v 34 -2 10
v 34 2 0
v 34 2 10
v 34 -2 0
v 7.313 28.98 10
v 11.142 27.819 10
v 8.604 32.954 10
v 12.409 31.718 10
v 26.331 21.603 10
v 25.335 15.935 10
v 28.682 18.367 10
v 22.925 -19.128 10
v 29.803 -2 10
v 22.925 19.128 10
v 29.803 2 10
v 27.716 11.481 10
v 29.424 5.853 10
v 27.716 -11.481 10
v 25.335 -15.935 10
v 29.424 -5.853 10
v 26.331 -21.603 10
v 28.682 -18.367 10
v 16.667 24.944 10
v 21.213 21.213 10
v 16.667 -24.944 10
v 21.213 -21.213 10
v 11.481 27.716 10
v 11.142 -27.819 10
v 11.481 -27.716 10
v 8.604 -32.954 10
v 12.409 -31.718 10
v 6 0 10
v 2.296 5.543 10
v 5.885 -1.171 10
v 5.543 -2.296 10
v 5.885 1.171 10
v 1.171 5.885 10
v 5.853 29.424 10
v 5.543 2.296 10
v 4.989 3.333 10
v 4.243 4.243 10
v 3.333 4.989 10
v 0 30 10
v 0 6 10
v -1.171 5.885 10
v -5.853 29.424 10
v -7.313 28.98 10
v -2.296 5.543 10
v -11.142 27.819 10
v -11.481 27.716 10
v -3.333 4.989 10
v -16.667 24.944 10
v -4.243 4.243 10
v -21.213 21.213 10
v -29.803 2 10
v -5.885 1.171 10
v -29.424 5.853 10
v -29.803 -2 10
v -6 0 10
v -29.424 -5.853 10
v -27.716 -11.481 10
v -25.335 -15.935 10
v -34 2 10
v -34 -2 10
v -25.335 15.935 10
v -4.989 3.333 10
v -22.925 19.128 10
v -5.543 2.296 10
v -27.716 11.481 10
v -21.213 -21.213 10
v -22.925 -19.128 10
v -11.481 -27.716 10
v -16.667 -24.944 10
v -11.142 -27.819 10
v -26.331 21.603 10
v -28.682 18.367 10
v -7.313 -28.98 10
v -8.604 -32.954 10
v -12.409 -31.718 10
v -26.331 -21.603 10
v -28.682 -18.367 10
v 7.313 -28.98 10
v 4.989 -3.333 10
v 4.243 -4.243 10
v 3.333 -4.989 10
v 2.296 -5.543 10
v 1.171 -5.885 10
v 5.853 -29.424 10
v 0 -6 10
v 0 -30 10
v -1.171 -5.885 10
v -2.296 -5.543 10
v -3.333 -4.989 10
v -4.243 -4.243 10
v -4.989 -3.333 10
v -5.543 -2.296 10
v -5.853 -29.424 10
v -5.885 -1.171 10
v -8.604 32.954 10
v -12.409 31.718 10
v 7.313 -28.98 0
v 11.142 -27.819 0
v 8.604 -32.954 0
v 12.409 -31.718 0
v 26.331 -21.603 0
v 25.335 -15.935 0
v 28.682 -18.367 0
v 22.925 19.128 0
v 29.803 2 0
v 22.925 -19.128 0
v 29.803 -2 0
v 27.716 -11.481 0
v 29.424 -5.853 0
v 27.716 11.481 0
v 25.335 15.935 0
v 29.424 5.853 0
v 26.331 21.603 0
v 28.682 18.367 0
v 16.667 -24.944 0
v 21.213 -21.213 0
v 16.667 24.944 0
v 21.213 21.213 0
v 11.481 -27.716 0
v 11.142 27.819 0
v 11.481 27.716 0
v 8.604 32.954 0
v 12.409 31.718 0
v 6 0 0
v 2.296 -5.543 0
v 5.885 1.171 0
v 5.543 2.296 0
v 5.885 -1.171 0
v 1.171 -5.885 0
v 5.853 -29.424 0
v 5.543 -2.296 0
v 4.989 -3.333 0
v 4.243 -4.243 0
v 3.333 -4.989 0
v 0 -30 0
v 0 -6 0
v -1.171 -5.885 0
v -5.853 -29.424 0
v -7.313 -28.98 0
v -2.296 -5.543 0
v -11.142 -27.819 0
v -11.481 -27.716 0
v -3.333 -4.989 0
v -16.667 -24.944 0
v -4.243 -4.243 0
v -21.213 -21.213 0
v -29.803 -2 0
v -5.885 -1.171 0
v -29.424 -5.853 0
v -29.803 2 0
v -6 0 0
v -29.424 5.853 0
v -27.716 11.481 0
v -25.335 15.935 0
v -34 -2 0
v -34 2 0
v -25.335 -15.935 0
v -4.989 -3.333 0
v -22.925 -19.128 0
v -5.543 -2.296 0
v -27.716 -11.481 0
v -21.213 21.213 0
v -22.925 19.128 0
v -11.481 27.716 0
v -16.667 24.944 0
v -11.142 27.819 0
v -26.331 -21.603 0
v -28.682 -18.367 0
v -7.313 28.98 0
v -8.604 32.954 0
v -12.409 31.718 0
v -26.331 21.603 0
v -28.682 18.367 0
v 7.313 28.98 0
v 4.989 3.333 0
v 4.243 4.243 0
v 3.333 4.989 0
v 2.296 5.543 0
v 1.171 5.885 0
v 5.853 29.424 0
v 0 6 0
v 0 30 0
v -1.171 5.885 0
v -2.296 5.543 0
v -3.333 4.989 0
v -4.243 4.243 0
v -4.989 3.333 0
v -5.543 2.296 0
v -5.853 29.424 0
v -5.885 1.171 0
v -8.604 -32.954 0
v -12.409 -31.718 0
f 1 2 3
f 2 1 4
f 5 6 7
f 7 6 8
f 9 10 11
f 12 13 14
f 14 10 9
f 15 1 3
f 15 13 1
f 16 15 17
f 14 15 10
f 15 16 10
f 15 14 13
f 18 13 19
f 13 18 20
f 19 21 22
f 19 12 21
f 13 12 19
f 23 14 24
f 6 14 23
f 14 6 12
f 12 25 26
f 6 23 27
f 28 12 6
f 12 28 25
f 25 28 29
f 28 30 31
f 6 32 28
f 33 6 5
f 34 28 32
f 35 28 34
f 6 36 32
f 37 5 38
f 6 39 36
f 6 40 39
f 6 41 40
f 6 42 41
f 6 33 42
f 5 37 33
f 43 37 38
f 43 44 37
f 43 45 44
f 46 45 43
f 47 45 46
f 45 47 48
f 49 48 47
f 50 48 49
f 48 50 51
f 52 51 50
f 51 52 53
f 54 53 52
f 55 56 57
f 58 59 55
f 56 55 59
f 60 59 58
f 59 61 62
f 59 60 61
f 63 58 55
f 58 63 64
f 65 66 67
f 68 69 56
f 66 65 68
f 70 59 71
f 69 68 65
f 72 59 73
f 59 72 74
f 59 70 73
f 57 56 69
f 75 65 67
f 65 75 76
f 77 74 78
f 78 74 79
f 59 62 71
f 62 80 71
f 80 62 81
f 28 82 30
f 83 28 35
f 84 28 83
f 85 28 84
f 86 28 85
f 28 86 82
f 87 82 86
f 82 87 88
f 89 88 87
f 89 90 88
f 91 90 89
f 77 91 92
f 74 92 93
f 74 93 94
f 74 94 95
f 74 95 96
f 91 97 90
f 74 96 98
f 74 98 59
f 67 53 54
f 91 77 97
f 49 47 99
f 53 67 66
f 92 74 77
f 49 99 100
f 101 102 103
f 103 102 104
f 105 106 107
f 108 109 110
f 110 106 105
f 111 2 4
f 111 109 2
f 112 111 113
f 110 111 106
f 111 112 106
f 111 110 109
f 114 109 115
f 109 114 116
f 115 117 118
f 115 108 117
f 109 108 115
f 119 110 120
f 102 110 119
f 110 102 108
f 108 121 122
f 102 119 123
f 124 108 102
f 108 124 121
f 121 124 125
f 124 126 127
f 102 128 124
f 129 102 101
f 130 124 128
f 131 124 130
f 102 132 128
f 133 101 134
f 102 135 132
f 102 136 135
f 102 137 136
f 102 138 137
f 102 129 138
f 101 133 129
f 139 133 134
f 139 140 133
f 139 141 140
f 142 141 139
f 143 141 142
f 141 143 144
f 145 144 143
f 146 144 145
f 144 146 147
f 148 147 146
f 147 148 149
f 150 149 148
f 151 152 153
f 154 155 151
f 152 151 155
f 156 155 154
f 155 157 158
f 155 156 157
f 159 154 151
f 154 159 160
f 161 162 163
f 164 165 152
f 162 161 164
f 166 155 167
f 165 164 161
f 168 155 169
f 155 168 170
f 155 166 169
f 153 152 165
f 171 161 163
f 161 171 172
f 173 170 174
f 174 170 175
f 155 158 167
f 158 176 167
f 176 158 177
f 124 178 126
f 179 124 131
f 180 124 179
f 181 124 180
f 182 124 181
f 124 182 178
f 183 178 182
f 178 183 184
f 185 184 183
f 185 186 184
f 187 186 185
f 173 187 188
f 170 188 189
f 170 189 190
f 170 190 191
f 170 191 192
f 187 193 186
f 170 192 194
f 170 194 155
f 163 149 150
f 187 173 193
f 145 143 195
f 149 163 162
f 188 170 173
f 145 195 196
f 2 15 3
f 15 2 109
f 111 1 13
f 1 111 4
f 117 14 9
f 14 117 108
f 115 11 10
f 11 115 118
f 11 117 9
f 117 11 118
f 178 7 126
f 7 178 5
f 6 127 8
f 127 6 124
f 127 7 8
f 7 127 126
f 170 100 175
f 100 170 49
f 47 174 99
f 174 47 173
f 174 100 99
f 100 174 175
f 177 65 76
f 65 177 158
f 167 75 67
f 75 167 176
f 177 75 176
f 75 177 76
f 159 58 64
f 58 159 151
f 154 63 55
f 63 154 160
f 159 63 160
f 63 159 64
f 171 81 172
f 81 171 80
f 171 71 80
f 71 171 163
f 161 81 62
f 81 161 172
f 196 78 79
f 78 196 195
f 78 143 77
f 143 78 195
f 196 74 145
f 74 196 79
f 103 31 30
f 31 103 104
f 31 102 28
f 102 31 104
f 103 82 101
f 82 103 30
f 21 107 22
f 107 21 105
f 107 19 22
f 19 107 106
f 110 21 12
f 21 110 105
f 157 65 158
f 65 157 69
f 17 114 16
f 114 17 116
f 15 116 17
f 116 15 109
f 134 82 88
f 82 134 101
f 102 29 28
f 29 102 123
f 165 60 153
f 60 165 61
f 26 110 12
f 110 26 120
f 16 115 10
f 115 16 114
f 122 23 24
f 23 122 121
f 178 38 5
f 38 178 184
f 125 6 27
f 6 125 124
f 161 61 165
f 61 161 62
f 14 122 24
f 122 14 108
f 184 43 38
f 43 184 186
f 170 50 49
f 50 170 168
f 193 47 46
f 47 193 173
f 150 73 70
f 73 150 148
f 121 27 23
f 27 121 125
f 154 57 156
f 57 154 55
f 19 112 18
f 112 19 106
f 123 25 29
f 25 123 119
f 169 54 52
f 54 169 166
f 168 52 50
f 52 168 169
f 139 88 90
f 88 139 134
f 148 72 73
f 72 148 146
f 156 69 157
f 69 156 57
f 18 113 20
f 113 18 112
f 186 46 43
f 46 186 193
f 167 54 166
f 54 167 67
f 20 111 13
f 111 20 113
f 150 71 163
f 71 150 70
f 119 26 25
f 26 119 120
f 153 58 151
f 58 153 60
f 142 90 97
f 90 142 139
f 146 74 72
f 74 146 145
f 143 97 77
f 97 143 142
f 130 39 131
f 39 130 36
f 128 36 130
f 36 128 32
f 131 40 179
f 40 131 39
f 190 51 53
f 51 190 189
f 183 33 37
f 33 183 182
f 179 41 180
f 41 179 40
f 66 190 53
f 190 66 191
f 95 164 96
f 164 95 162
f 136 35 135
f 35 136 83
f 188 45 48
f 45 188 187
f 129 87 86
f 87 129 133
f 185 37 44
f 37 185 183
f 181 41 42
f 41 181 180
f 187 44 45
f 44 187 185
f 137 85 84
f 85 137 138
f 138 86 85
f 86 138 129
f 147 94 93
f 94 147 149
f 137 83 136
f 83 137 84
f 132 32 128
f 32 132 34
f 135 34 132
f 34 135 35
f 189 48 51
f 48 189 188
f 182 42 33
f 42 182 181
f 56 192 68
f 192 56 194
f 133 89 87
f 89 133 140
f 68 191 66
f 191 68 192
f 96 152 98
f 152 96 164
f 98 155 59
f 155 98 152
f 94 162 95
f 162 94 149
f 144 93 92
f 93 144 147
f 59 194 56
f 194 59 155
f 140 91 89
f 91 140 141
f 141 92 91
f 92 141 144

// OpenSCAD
$fn = 32;

// ----------------------------------------------------------------------
// Spur blank: bored gear blank
// ----------------------------------------------------------------------

// --- parameters (mm) ---
disc_r = 30;              // blank root radius
disc_t = 10;              // blank thickness
n_teeth = 10;             // stub tooth count
tooth_w = 4;              // tooth width at the root
tooth_h = 4;              // tooth height above the root
bore_r = 6;               // central bore radius

out_r = disc_r + tooth_h;  // tip radius
bbox_x = 68.0;  // measured width over the teeth
bbox_y = 65.91;  // measured depth over the teeth

difference() {
union() {
  cylinder(r = disc_r, h = disc_t);
  for (i = [0 : n_teeth - 1])
    rotate([0, 0, i * 360 / n_teeth])
      translate([disc_r - 1, -tooth_w / 2, 0])
        cube([tooth_h + 1, tooth_w, disc_t]);
}
  translate([0, 0, -1]) cylinder(r = bore_r, h = disc_t + 2);
}
